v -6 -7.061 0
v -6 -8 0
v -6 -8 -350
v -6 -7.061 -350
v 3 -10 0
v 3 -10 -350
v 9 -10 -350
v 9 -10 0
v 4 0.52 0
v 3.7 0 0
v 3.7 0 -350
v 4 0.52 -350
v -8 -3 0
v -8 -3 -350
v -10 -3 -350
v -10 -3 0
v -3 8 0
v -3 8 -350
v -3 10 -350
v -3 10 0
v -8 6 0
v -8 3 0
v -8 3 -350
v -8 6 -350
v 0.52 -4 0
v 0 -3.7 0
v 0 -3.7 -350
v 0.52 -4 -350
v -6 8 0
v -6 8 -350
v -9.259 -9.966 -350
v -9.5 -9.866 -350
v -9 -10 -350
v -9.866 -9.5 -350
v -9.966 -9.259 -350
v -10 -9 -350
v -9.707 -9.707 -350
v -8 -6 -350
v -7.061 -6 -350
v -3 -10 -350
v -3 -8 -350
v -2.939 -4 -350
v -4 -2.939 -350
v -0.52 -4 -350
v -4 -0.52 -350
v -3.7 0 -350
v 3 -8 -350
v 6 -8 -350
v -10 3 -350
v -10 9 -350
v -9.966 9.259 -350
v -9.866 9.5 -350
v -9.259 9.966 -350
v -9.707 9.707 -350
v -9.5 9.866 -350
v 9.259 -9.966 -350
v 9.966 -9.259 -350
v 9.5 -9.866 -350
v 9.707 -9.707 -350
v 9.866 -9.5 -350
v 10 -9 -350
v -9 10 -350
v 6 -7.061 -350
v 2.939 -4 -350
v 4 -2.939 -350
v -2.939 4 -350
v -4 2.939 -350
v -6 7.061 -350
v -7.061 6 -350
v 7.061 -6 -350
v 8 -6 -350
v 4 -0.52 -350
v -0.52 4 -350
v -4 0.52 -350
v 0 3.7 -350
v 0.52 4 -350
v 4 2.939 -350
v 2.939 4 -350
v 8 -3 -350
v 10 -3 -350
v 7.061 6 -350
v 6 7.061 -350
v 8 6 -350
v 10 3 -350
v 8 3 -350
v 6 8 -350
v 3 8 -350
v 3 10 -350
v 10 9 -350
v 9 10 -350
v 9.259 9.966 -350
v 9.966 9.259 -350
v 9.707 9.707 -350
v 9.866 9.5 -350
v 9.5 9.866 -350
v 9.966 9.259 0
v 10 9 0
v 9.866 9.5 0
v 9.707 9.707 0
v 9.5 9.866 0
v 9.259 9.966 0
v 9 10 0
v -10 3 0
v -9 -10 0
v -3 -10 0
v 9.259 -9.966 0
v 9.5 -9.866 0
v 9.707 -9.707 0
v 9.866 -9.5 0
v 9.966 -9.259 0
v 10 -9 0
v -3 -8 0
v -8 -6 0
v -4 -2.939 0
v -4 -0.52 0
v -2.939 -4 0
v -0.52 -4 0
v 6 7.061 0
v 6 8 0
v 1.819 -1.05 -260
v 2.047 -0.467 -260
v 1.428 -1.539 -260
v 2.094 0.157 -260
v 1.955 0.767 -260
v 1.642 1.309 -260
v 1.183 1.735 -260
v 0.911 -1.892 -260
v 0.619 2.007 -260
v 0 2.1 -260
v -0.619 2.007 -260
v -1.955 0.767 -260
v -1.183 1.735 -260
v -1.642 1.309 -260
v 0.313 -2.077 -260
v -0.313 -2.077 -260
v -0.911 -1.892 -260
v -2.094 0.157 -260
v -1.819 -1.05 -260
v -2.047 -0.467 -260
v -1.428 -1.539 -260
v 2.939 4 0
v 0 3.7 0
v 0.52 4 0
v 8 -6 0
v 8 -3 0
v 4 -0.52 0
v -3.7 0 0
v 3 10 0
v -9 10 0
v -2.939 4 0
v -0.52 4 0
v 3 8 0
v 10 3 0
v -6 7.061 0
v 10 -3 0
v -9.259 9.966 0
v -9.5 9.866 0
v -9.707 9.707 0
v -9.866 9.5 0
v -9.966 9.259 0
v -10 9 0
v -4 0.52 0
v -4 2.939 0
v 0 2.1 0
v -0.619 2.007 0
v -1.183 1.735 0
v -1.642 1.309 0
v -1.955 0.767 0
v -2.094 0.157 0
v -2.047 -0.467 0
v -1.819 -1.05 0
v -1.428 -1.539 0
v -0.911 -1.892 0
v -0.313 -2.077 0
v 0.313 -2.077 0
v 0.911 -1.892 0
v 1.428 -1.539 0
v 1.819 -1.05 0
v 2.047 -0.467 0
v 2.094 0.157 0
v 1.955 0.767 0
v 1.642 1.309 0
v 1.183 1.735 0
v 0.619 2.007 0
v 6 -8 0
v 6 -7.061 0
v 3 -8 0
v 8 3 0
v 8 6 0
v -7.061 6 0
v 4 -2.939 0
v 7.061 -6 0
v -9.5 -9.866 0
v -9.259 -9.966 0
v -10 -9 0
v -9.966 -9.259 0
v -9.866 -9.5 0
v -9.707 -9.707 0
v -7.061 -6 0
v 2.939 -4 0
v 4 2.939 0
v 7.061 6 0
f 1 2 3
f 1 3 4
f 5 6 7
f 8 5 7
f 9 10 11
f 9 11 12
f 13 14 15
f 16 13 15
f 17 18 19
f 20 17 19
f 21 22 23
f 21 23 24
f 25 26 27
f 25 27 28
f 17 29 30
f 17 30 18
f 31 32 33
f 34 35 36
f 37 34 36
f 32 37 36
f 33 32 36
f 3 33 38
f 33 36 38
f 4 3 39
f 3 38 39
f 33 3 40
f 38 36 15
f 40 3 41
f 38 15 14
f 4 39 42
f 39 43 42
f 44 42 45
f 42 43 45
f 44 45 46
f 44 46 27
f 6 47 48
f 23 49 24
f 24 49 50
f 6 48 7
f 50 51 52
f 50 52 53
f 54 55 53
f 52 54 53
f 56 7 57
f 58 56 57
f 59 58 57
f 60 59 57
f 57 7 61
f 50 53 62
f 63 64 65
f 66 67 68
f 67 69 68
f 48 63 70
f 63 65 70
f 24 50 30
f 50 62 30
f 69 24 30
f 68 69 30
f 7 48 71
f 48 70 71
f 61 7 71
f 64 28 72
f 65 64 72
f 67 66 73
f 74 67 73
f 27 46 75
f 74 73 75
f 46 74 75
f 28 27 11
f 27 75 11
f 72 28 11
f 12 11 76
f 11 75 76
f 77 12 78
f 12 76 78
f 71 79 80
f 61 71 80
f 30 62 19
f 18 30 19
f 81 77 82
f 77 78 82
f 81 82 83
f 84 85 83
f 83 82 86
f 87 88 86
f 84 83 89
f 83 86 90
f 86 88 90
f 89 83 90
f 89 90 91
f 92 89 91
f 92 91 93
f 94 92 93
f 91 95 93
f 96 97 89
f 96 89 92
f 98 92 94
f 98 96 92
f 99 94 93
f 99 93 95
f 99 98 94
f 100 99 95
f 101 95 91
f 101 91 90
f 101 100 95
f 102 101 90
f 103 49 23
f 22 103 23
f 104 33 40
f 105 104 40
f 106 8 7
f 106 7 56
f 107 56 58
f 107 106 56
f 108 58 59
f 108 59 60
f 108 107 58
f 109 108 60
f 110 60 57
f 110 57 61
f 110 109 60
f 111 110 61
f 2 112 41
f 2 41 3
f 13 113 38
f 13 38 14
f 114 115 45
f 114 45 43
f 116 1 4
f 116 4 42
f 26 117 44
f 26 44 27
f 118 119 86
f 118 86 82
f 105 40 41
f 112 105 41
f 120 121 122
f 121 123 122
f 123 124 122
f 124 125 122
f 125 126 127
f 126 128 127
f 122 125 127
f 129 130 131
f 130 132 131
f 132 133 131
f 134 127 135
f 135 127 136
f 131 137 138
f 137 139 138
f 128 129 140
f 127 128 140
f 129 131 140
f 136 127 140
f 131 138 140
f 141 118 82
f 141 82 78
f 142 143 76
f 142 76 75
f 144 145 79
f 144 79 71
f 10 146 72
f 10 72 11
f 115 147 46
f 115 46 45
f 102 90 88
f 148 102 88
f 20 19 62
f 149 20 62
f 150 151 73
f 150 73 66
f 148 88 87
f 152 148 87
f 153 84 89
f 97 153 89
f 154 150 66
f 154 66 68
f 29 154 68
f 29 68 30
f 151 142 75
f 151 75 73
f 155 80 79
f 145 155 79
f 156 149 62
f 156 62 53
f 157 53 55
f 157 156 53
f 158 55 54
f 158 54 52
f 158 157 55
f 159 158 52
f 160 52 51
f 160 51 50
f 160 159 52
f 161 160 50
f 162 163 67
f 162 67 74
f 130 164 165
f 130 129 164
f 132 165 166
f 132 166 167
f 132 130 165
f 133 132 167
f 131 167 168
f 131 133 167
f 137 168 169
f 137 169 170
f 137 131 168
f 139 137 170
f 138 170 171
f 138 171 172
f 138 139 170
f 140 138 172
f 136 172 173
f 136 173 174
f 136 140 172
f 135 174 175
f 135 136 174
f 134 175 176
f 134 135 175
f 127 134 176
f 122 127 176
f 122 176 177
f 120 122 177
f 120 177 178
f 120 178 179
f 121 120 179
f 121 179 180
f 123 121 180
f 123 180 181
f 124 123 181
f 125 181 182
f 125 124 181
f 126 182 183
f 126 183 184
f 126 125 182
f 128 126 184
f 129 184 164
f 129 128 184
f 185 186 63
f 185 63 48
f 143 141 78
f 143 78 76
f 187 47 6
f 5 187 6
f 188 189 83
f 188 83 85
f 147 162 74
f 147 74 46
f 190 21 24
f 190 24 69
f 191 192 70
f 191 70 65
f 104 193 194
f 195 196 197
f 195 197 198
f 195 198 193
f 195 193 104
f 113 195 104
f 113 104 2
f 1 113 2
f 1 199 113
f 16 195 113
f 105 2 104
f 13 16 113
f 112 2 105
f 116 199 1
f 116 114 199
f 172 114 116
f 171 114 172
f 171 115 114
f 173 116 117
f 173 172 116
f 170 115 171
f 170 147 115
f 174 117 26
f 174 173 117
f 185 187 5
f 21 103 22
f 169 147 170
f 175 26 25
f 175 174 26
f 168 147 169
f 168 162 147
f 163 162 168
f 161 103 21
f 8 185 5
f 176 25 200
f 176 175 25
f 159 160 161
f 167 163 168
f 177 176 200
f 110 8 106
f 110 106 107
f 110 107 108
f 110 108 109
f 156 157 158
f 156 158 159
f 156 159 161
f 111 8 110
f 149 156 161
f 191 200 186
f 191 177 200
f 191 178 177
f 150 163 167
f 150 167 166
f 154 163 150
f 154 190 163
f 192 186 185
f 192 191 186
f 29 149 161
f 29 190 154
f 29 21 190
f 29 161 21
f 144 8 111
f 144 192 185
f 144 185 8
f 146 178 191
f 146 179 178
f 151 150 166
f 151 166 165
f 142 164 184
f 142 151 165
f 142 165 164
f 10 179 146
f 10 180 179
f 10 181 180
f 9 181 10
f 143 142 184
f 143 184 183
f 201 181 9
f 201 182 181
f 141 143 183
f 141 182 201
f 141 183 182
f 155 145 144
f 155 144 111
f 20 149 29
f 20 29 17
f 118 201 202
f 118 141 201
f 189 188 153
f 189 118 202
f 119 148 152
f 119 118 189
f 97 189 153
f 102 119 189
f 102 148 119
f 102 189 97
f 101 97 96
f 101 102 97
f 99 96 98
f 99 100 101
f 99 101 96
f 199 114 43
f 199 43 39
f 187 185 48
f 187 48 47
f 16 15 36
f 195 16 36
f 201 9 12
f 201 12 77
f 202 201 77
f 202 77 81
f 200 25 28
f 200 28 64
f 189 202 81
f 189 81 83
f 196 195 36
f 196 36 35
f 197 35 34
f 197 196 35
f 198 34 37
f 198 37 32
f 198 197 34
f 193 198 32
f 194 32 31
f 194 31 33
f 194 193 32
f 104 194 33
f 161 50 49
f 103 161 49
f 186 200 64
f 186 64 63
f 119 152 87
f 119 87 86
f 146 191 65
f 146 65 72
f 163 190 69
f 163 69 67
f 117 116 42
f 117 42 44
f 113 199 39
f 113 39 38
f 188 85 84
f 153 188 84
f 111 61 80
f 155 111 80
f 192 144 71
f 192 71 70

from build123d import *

# Parameters (mm, degrees)
EXTRUDE_1_DEPTH = 350
SKETCH_2_W      = 260
SKETCH_2_H      = 2.1


with BuildPart() as part:
    # ｽｹｯﾁ1 → ﾎﾞｽ - 押し出し1 (new body)
    with BuildSketch(Plane.XY):
        with BuildLine():
            Line((-10, -3), (-10, -9))
            ThreePointArc((-10, -9), (-9.707106781, -9.707106781), (-9, -10))
            Line((-9, -10), (-3, -10))
            Line((-3, -10), (-3, -8))
            Line((-3, -8), (-6, -8))
            Line((-6, -8), (-6, -7.060660172))
            Line((-6, -7.060660172), (-2.939339828, -4))
            Line((-2.939339828, -4), (-0.519615242, -4))
            Line((-0.519615242, -4), (0, -3.7))
            Line((0, -3.7), (0.519615242, -4))
            Line((0.519615242, -4), (2.939339828, -4))
            Line((2.939339828, -4), (6, -7.060660172))
            Line((6, -7.060660172), (6, -8))
            Line((6, -8), (3, -8))
            Line((3, -8), (3, -10))
            Line((3, -10), (9, -10))
            ThreePointArc((9, -10), (9.707106781, -9.707106781), (10, -9))
            Line((10, -9), (10, -3))
            Line((10, -3), (8, -3))
            Line((8, -3), (8, -6))
            Line((8, -6), (7.060660172, -6))
            Line((7.060660172, -6), (4, -2.939339828))
            Line((4, -2.939339828), (4, -0.519615242))
            Line((4, -0.519615242), (3.7, 0))
            Line((3.7, 0), (4, 0.519615242))
            Line((4, 0.519615242), (4, 2.939339828))
            Line((4, 2.939339828), (7.060660172, 6))
            Line((7.060660172, 6), (8, 6))
            Line((8, 6), (8, 3))
            Line((8, 3), (10, 3))
            Line((10, 3), (10, 9))
            ThreePointArc((10, 9), (9.707106781, 9.707106781), (9, 10))
            Line((9, 10), (3, 10))
            Line((3, 10), (3, 8))
            Line((3, 8), (6, 8))
            Line((6, 8), (6, 7.060660172))
            Line((6, 7.060660172), (2.939339828, 4))
            Line((2.939339828, 4), (0.519615242, 4))
            Line((0.519615242, 4), (0, 3.7))
            Line((0, 3.7), (-0.519615242, 4))
            Line((-0.519615242, 4), (-2.939339828, 4))
            Line((-2.939339828, 4), (-6, 7.060660172))
            Line((-6, 7.060660172), (-6, 8))
            Line((-6, 8), (-3, 8))
            Line((-3, 8), (-3, 10))
            Line((-3, 10), (-9, 10))
            ThreePointArc((-9, 10), (-9.707106781, 9.707106781), (-10, 9))
            Line((-10, 9), (-10, 3))
            Line((-10, 3), (-8, 3))
            Line((-8, 3), (-8, 6))
            Line((-8, 6), (-7.060660172, 6))
            Line((-7.060660172, 6), (-4, 2.939339828))
            Line((-4, 2.939339828), (-4, 0.519615242))
            Line((-4, 0.519615242), (-3.7, 0))
            Line((-3.7, 0), (-4, -0.519615242))
            Line((-4, -0.519615242), (-4, -2.939339828))
            Line((-4, -2.939339828), (-7.060660172, -6))
            Line((-7.060660172, -6), (-8, -6))
            Line((-8, -6), (-8, -3))
            Line((-8, -3), (-10, -3))
        make_face()
    extrude(amount=-EXTRUDE_1_DEPTH)

    # ｽｹｯﾁ2 → ｶｯﾄ - 回転1 (revolve, cut)
    with BuildSketch(Plane(origin=(0, 0, 0), x_dir=(0, 0, -1), z_dir=(1, 0, 0))):
        with Locations((130, 1.05)):
            Rectangle(SKETCH_2_W, SKETCH_2_H)
    revolve(axis=Axis((0, 0, -260), (0, 0, 1)), mode=Mode.SUBTRACT)


solid = part.part
